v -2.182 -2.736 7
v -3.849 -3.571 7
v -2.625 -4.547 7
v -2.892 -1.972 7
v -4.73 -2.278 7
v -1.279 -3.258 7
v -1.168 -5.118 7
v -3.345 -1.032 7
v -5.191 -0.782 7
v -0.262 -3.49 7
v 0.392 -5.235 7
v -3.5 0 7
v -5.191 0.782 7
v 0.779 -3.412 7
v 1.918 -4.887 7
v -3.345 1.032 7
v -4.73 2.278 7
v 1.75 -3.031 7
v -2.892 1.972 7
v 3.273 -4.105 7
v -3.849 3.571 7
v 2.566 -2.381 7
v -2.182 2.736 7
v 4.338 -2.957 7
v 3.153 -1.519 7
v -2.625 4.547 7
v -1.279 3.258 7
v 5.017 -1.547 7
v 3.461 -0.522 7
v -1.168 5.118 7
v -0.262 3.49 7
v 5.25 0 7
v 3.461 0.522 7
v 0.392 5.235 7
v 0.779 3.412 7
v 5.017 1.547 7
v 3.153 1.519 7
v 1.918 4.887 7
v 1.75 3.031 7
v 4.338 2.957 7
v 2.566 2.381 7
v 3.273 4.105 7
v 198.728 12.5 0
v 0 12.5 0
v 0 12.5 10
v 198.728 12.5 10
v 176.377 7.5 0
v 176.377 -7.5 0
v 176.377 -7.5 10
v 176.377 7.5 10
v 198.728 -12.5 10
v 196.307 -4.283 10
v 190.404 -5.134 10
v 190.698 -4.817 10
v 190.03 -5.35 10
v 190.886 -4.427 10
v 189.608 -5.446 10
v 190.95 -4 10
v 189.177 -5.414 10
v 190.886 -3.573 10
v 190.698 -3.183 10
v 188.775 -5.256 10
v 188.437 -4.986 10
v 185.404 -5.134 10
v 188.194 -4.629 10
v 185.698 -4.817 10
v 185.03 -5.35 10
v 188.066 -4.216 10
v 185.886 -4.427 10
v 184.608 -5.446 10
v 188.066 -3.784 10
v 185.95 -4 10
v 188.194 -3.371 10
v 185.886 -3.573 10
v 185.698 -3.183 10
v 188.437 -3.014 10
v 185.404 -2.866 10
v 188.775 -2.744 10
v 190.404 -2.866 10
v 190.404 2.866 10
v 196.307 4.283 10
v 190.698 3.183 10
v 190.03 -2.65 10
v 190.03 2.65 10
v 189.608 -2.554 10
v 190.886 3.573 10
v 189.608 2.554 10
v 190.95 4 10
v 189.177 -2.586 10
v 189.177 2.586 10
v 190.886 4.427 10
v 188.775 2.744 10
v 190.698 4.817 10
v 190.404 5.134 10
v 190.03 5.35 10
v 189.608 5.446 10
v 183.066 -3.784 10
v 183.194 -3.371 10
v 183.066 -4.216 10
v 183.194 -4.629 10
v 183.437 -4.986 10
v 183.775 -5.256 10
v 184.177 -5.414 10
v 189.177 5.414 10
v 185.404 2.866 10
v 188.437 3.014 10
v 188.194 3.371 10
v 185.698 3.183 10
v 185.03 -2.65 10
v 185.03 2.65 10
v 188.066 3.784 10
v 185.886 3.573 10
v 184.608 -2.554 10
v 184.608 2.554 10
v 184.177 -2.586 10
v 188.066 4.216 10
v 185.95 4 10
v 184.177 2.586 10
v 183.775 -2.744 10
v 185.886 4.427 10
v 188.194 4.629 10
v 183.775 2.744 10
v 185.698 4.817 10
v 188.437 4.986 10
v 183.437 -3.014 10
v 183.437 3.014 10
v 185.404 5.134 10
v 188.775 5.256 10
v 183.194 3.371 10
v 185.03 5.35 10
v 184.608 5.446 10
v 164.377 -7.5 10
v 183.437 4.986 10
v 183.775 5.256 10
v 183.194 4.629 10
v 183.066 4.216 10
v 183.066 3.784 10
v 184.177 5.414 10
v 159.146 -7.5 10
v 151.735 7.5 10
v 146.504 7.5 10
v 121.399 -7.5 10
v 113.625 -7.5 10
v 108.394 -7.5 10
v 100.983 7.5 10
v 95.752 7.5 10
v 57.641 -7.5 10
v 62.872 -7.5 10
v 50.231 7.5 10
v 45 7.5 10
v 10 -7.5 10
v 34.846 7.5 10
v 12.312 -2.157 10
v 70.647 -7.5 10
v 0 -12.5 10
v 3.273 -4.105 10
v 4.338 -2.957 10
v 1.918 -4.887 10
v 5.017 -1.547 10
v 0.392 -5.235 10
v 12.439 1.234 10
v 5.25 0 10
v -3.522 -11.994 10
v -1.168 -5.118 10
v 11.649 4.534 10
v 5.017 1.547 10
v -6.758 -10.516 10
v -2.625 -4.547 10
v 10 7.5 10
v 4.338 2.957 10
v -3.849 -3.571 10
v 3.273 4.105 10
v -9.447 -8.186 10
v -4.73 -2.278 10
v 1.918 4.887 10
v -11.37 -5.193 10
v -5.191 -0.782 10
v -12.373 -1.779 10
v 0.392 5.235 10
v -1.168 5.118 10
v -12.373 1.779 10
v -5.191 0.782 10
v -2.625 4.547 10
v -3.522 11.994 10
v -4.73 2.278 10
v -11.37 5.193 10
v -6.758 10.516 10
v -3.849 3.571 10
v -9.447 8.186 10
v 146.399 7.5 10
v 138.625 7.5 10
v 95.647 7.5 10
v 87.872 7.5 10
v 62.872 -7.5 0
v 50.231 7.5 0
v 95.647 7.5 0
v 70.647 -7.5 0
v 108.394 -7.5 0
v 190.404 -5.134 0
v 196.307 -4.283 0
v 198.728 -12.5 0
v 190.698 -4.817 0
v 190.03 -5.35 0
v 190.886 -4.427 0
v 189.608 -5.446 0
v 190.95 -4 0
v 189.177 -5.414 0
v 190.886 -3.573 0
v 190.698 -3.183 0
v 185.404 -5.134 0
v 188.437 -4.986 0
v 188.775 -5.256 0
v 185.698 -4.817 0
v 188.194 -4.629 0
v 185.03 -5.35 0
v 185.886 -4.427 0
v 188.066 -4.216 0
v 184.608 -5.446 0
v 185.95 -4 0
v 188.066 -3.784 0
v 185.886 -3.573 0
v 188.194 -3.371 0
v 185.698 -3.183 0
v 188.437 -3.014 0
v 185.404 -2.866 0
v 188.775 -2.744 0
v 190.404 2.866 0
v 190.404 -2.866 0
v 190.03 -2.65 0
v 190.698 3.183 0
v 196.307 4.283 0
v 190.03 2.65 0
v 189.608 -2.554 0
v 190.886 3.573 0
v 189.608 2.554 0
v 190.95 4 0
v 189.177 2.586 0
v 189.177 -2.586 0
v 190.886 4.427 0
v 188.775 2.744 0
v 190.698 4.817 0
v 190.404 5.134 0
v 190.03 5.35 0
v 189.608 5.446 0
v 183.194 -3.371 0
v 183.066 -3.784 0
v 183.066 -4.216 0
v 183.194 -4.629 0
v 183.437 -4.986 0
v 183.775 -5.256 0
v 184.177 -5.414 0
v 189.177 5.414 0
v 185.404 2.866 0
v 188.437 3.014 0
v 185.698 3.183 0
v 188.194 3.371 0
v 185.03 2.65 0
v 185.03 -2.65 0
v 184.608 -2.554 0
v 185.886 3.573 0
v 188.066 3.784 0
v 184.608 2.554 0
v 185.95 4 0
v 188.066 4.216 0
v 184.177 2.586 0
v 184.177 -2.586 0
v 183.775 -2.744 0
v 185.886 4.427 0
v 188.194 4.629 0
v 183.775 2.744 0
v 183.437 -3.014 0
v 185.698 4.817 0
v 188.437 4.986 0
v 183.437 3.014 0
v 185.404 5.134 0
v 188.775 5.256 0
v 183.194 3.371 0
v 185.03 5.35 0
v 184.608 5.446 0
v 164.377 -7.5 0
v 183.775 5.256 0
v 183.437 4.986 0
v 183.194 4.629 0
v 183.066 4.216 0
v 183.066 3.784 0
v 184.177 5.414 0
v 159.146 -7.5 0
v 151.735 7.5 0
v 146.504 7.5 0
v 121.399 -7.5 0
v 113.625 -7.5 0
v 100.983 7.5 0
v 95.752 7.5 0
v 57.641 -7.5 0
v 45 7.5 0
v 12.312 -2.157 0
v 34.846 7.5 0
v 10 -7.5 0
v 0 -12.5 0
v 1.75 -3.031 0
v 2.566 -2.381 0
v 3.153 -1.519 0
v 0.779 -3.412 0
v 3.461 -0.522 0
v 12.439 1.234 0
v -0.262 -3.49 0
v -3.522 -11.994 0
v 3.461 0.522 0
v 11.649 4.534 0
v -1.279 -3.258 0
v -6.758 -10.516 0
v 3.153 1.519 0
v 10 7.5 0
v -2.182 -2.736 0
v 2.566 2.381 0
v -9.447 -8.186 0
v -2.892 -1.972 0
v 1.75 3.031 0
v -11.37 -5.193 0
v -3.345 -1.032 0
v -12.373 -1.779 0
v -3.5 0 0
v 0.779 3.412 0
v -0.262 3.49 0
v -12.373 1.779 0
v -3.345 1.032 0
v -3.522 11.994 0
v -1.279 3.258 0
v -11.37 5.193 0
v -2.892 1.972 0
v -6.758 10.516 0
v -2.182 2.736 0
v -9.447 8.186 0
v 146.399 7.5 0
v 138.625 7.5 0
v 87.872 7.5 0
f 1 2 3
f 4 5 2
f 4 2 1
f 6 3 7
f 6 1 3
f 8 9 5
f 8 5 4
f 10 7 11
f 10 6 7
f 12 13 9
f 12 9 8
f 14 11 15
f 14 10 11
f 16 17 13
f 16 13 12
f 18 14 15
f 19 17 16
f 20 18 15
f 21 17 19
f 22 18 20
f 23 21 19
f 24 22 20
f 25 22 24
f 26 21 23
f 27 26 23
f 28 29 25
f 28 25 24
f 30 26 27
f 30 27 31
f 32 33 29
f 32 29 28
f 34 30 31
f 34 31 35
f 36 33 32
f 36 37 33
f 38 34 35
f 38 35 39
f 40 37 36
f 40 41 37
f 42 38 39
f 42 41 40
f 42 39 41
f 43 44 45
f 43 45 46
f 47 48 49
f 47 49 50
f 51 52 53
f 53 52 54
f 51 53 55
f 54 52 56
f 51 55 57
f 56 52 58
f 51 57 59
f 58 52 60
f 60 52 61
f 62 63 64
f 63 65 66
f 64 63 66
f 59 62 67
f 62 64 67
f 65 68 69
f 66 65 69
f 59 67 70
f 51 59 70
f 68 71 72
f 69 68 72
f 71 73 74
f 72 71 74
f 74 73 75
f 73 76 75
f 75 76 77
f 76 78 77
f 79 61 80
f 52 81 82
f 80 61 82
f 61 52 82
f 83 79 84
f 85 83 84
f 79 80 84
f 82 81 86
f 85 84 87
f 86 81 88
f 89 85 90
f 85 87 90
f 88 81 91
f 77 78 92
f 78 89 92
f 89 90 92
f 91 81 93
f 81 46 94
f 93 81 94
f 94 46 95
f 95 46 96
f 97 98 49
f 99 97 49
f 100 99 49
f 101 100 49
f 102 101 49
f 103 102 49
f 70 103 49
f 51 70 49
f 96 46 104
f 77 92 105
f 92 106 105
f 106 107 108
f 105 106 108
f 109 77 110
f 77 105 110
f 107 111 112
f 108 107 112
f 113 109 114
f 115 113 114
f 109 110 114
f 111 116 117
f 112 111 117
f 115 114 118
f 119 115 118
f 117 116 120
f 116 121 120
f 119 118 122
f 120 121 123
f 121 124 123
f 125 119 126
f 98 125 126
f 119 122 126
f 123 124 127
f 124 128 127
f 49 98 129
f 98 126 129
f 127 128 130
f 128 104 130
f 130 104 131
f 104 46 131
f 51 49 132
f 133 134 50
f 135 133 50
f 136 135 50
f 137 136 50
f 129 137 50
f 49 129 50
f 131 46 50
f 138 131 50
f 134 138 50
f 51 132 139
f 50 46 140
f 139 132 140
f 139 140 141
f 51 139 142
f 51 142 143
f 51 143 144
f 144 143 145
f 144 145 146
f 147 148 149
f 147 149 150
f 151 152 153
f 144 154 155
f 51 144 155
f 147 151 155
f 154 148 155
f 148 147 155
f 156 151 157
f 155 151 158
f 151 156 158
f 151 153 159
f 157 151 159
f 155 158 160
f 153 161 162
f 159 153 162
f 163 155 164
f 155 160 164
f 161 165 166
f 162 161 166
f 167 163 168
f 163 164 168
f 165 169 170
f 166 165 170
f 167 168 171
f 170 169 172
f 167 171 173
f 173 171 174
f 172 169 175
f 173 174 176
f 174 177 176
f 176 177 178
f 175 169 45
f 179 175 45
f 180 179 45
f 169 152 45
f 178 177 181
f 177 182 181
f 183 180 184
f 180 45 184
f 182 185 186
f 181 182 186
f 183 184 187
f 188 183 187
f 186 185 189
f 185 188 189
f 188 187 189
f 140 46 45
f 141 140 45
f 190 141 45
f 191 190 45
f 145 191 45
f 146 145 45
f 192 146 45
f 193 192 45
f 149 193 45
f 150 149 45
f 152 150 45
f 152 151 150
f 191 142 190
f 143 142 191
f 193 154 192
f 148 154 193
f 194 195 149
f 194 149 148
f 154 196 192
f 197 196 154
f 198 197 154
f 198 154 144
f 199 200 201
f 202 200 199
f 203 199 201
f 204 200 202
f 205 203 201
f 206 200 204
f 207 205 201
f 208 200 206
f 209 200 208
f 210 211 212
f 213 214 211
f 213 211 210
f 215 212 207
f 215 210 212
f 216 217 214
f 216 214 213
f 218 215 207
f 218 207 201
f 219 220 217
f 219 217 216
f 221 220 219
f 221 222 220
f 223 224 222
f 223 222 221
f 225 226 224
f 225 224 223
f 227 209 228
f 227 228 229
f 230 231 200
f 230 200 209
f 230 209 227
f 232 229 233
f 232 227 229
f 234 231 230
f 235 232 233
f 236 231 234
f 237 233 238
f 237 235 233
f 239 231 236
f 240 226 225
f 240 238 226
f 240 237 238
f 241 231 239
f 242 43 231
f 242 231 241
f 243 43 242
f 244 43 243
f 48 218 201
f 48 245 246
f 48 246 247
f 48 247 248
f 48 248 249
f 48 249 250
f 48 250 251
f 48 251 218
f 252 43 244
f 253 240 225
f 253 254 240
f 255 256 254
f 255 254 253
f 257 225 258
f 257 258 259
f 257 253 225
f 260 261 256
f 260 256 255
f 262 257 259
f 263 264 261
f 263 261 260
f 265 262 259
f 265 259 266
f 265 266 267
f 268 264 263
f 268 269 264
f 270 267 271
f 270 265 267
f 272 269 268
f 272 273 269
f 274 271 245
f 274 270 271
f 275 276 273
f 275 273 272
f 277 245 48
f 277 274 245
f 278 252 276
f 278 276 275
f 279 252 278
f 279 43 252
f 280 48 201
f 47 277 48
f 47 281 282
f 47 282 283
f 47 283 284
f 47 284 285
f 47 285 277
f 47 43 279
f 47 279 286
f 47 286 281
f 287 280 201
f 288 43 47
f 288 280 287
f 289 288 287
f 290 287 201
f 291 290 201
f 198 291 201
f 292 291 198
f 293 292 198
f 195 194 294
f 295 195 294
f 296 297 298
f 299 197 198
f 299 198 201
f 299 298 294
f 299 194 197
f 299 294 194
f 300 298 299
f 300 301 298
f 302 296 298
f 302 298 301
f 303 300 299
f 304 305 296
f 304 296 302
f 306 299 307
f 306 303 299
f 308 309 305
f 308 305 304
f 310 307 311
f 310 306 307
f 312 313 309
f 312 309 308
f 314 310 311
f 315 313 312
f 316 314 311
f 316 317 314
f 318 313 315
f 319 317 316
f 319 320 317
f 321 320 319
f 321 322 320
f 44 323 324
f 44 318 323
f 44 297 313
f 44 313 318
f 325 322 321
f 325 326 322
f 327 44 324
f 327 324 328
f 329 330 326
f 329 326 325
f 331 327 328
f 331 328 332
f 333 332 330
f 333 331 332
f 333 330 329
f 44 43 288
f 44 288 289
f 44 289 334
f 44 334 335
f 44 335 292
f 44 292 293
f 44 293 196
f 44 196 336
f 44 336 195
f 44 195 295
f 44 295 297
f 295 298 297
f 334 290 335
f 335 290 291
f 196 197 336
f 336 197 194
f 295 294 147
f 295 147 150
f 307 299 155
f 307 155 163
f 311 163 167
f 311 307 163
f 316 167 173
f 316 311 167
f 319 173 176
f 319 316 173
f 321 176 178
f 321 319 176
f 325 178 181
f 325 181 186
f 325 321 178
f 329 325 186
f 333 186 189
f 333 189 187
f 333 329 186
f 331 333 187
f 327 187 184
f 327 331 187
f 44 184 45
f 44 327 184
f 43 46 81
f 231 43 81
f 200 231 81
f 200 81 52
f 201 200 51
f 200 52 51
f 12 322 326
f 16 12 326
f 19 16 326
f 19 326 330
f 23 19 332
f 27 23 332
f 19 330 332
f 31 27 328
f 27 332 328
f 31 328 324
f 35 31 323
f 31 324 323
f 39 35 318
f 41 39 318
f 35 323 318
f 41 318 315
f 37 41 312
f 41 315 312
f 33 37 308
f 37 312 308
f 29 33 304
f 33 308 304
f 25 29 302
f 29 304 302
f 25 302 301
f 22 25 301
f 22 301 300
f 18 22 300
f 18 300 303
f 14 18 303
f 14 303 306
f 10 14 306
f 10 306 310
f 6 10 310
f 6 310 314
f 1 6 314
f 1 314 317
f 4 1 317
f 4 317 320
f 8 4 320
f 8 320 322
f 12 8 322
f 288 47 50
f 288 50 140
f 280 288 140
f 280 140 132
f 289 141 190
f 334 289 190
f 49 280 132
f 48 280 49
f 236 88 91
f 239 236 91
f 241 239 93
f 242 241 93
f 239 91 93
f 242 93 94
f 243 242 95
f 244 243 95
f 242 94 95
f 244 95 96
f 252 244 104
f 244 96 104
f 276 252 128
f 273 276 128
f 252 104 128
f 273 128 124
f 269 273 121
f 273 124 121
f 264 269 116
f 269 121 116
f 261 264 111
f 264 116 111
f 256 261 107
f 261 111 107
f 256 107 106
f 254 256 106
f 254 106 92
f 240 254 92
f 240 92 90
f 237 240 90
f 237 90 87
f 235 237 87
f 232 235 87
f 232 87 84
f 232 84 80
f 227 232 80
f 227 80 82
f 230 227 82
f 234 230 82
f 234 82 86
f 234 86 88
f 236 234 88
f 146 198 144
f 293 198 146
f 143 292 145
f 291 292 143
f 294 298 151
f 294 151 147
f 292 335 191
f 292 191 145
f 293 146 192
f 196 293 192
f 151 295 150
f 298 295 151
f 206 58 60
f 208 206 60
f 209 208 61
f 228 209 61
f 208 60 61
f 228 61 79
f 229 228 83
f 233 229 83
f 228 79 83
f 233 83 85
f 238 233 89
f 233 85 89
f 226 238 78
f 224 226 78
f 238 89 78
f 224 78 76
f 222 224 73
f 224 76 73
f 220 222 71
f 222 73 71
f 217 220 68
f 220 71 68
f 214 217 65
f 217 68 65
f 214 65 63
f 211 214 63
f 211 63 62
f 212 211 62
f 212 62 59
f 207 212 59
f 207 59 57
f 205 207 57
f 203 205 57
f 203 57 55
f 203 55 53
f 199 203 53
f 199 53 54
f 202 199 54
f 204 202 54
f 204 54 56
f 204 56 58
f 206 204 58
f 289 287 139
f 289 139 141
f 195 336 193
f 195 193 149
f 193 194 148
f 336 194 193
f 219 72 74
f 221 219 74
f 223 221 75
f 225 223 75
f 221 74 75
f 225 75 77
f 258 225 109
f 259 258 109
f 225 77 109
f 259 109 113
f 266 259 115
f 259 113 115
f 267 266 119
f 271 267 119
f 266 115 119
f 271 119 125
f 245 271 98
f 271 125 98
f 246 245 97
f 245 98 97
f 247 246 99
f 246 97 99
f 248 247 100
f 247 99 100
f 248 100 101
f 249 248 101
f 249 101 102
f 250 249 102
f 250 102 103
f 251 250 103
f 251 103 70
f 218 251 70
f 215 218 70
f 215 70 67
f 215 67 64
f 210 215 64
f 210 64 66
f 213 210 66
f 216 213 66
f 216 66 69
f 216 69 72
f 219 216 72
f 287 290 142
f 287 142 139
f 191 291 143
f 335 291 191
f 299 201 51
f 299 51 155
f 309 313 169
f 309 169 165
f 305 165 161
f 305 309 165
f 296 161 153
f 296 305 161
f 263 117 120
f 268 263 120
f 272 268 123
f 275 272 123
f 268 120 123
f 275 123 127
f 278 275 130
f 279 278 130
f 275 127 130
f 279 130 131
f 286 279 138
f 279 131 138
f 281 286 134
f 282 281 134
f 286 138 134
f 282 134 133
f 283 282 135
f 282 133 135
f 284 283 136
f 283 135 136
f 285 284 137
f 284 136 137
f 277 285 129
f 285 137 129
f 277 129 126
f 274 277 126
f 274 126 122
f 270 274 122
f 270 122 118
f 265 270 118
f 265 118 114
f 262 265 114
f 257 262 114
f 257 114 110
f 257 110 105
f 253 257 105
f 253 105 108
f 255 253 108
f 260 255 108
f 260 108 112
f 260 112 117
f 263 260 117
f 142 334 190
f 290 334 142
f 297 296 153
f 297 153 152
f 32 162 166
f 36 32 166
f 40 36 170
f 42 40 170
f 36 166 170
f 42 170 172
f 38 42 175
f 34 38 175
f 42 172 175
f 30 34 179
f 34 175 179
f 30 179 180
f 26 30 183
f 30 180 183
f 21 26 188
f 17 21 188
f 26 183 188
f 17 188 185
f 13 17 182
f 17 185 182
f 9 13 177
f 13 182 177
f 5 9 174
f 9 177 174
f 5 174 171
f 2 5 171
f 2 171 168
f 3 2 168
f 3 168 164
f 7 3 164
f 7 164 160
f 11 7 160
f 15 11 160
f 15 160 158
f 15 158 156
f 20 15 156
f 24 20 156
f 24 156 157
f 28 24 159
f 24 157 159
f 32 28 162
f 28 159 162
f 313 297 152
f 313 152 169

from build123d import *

# Parameters (mm, degrees)
EXTRUDE_1_DEPTH          = 10
CUT_EXTRUDE_1_DEPTH      = 252.652538235
CUT_EXTRUDE_1_DEPTH_BACK = 252.652538235
SKETCH_7_R               = 3.5
CUT_EXTRUDE_5_DEPTH      = 252.652538235
SKETCH_8_R               = 5
CUT_EXTRUDE_6_DEPTH      = 3
SKETCH_9_R               = 3
CUT_EXTRUDE_7_DEPTH      = 252.652538235
SKETCH_10_R              = 5.25
CUT_EXTRUDE_8_DEPTH      = 3
CUT_EXTRUDE_START        = -10
SKETCH_11_R              = 27
CUT_EXTRUDE_9_DEPTH      = 10
SKETCH_12_R              = 30
CUT_EXTRUDE_10_DEPTH     = 10
SKETCH_14_R              = 1.45
CUT_EXTRUDE_12_DEPTH     = 300


with BuildPart() as part:
    # 草图1 → 凸台-拉伸1 (new body)
    with BuildSketch(Plane.XY):
        with BuildLine():
            Line((0, 12.5), (199.067804112, 12.5))
            ThreePointArc((199.067804112, 12.5), (250, 0), (199.067804112, -12.5))
            Line((199.067804112, -12.5), (0, -12.5))
            ThreePointArc((0, -12.5), (-12.5, 0), (0, 12.5))
        make_face()
    extrude(amount=EXTRUDE_1_DEPTH)

    # 草图3 → 切除-拉伸1 (cut, two sides: drawn at the far end of the back side and taken through both)
    with BuildSketch(Plane.XY.offset(10).offset(-CUT_EXTRUDE_1_DEPTH_BACK)):
        Polygon((176.376805713, 7.5), (151.73545401, 7.5), (164.376805713, -7.5), (176.376805713, -7.5), align=None)
        Polygon((159.145761472, -7.5), (146.504409769, 7.5), (146.399203355, 7.5), (121.399203355, -7.5), align=None)
        Polygon((113.624600829, -7.5), (138.624600829, 7.5), (100.983249125, 7.5), align=None)
        Polygon((70.646998471, -7.5), (108.393556588, -7.5), (95.752204884, 7.5), (95.646998471, 7.5), align=None)
        Polygon((50.231044241, 7.5), (62.872395944, -7.5), (87.872395944, 7.5), align=None)
        Polygon((10, -7.5), (57.641351703, -7.5), (45, 7.5), align=None)
        with BuildLine():
            Line((34.845635859, 7.5), (10, 7.5))
            ThreePointArc((10, 7.5), (12.156331085, 2.910947362), (12.312475569, -2.157068696))
            Line((12.312475569, -2.157068696), (34.845635859, 7.5))
        make_face()
    extrude(amount=CUT_EXTRUDE_1_DEPTH + CUT_EXTRUDE_1_DEPTH_BACK, mode=Mode.SUBTRACT)

    # 草图7 → 切除-拉伸5 (cut, through all)
    with BuildSketch(Plane(origin=(0, 0, 0), x_dir=(-1, 0, 0), z_dir=(0, 0, -1))):
        Circle(SKETCH_7_R)
    extrude(amount=-CUT_EXTRUDE_5_DEPTH, mode=Mode.SUBTRACT)

    # 草图8 → 切除-拉伸6 (cut)
    with BuildSketch(Plane(origin=(0, 0, 0), x_dir=(-1, 0, 0), z_dir=(0, 0, -1))):
        with Locations((-223, 0)):
            Circle(SKETCH_8_R)
    extrude(amount=-CUT_EXTRUDE_6_DEPTH, mode=Mode.SUBTRACT)

    # 草图9 → 切除-拉伸7 (cut, through all)
    with BuildSketch(Plane(origin=(0, 0, 0), x_dir=(-1, 0, 0), z_dir=(0, 0, -1))):
        with Locations((-223, 0)):
            Circle(SKETCH_9_R)
    extrude(amount=-CUT_EXTRUDE_7_DEPTH, mode=Mode.SUBTRACT)

    # 草图10 → 切除-拉伸8 (cut)
    with BuildSketch(Plane.XY.offset(10)):
        Circle(SKETCH_10_R)
    extrude(amount=-CUT_EXTRUDE_8_DEPTH, mode=Mode.SUBTRACT)

    # 草图11 → 切除-拉伸9 (cut)
    with BuildSketch(Plane.XY.offset(10).offset(CUT_EXTRUDE_START)):
        with Locations((223, 0)):
            Circle(SKETCH_11_R)
    extrude(amount=CUT_EXTRUDE_9_DEPTH, mode=Mode.SUBTRACT)

    # 草图12 → 切除-拉伸10 (cut)
    with BuildSketch(Plane.XY.offset(10)):
        with Locations((226, 0)):
            Circle(SKETCH_12_R)
    extrude(amount=-CUT_EXTRUDE_10_DEPTH, mode=Mode.SUBTRACT)

    # 草图14 → 切除-拉伸12 (cut)
    with BuildSketch(Plane.XY.offset(10)):
        with Locations((184.5, 4)):
            Circle(SKETCH_14_R)
        with Locations((189.5, 4)):
            Circle(SKETCH_14_R)
        with Locations((189.5, -4)):
            Circle(SKETCH_14_R)
        with Locations((184.5, -4)):
            Circle(SKETCH_14_R)
    extrude(amount=-CUT_EXTRUDE_12_DEPTH, mode=Mode.SUBTRACT)


solid = part.part
